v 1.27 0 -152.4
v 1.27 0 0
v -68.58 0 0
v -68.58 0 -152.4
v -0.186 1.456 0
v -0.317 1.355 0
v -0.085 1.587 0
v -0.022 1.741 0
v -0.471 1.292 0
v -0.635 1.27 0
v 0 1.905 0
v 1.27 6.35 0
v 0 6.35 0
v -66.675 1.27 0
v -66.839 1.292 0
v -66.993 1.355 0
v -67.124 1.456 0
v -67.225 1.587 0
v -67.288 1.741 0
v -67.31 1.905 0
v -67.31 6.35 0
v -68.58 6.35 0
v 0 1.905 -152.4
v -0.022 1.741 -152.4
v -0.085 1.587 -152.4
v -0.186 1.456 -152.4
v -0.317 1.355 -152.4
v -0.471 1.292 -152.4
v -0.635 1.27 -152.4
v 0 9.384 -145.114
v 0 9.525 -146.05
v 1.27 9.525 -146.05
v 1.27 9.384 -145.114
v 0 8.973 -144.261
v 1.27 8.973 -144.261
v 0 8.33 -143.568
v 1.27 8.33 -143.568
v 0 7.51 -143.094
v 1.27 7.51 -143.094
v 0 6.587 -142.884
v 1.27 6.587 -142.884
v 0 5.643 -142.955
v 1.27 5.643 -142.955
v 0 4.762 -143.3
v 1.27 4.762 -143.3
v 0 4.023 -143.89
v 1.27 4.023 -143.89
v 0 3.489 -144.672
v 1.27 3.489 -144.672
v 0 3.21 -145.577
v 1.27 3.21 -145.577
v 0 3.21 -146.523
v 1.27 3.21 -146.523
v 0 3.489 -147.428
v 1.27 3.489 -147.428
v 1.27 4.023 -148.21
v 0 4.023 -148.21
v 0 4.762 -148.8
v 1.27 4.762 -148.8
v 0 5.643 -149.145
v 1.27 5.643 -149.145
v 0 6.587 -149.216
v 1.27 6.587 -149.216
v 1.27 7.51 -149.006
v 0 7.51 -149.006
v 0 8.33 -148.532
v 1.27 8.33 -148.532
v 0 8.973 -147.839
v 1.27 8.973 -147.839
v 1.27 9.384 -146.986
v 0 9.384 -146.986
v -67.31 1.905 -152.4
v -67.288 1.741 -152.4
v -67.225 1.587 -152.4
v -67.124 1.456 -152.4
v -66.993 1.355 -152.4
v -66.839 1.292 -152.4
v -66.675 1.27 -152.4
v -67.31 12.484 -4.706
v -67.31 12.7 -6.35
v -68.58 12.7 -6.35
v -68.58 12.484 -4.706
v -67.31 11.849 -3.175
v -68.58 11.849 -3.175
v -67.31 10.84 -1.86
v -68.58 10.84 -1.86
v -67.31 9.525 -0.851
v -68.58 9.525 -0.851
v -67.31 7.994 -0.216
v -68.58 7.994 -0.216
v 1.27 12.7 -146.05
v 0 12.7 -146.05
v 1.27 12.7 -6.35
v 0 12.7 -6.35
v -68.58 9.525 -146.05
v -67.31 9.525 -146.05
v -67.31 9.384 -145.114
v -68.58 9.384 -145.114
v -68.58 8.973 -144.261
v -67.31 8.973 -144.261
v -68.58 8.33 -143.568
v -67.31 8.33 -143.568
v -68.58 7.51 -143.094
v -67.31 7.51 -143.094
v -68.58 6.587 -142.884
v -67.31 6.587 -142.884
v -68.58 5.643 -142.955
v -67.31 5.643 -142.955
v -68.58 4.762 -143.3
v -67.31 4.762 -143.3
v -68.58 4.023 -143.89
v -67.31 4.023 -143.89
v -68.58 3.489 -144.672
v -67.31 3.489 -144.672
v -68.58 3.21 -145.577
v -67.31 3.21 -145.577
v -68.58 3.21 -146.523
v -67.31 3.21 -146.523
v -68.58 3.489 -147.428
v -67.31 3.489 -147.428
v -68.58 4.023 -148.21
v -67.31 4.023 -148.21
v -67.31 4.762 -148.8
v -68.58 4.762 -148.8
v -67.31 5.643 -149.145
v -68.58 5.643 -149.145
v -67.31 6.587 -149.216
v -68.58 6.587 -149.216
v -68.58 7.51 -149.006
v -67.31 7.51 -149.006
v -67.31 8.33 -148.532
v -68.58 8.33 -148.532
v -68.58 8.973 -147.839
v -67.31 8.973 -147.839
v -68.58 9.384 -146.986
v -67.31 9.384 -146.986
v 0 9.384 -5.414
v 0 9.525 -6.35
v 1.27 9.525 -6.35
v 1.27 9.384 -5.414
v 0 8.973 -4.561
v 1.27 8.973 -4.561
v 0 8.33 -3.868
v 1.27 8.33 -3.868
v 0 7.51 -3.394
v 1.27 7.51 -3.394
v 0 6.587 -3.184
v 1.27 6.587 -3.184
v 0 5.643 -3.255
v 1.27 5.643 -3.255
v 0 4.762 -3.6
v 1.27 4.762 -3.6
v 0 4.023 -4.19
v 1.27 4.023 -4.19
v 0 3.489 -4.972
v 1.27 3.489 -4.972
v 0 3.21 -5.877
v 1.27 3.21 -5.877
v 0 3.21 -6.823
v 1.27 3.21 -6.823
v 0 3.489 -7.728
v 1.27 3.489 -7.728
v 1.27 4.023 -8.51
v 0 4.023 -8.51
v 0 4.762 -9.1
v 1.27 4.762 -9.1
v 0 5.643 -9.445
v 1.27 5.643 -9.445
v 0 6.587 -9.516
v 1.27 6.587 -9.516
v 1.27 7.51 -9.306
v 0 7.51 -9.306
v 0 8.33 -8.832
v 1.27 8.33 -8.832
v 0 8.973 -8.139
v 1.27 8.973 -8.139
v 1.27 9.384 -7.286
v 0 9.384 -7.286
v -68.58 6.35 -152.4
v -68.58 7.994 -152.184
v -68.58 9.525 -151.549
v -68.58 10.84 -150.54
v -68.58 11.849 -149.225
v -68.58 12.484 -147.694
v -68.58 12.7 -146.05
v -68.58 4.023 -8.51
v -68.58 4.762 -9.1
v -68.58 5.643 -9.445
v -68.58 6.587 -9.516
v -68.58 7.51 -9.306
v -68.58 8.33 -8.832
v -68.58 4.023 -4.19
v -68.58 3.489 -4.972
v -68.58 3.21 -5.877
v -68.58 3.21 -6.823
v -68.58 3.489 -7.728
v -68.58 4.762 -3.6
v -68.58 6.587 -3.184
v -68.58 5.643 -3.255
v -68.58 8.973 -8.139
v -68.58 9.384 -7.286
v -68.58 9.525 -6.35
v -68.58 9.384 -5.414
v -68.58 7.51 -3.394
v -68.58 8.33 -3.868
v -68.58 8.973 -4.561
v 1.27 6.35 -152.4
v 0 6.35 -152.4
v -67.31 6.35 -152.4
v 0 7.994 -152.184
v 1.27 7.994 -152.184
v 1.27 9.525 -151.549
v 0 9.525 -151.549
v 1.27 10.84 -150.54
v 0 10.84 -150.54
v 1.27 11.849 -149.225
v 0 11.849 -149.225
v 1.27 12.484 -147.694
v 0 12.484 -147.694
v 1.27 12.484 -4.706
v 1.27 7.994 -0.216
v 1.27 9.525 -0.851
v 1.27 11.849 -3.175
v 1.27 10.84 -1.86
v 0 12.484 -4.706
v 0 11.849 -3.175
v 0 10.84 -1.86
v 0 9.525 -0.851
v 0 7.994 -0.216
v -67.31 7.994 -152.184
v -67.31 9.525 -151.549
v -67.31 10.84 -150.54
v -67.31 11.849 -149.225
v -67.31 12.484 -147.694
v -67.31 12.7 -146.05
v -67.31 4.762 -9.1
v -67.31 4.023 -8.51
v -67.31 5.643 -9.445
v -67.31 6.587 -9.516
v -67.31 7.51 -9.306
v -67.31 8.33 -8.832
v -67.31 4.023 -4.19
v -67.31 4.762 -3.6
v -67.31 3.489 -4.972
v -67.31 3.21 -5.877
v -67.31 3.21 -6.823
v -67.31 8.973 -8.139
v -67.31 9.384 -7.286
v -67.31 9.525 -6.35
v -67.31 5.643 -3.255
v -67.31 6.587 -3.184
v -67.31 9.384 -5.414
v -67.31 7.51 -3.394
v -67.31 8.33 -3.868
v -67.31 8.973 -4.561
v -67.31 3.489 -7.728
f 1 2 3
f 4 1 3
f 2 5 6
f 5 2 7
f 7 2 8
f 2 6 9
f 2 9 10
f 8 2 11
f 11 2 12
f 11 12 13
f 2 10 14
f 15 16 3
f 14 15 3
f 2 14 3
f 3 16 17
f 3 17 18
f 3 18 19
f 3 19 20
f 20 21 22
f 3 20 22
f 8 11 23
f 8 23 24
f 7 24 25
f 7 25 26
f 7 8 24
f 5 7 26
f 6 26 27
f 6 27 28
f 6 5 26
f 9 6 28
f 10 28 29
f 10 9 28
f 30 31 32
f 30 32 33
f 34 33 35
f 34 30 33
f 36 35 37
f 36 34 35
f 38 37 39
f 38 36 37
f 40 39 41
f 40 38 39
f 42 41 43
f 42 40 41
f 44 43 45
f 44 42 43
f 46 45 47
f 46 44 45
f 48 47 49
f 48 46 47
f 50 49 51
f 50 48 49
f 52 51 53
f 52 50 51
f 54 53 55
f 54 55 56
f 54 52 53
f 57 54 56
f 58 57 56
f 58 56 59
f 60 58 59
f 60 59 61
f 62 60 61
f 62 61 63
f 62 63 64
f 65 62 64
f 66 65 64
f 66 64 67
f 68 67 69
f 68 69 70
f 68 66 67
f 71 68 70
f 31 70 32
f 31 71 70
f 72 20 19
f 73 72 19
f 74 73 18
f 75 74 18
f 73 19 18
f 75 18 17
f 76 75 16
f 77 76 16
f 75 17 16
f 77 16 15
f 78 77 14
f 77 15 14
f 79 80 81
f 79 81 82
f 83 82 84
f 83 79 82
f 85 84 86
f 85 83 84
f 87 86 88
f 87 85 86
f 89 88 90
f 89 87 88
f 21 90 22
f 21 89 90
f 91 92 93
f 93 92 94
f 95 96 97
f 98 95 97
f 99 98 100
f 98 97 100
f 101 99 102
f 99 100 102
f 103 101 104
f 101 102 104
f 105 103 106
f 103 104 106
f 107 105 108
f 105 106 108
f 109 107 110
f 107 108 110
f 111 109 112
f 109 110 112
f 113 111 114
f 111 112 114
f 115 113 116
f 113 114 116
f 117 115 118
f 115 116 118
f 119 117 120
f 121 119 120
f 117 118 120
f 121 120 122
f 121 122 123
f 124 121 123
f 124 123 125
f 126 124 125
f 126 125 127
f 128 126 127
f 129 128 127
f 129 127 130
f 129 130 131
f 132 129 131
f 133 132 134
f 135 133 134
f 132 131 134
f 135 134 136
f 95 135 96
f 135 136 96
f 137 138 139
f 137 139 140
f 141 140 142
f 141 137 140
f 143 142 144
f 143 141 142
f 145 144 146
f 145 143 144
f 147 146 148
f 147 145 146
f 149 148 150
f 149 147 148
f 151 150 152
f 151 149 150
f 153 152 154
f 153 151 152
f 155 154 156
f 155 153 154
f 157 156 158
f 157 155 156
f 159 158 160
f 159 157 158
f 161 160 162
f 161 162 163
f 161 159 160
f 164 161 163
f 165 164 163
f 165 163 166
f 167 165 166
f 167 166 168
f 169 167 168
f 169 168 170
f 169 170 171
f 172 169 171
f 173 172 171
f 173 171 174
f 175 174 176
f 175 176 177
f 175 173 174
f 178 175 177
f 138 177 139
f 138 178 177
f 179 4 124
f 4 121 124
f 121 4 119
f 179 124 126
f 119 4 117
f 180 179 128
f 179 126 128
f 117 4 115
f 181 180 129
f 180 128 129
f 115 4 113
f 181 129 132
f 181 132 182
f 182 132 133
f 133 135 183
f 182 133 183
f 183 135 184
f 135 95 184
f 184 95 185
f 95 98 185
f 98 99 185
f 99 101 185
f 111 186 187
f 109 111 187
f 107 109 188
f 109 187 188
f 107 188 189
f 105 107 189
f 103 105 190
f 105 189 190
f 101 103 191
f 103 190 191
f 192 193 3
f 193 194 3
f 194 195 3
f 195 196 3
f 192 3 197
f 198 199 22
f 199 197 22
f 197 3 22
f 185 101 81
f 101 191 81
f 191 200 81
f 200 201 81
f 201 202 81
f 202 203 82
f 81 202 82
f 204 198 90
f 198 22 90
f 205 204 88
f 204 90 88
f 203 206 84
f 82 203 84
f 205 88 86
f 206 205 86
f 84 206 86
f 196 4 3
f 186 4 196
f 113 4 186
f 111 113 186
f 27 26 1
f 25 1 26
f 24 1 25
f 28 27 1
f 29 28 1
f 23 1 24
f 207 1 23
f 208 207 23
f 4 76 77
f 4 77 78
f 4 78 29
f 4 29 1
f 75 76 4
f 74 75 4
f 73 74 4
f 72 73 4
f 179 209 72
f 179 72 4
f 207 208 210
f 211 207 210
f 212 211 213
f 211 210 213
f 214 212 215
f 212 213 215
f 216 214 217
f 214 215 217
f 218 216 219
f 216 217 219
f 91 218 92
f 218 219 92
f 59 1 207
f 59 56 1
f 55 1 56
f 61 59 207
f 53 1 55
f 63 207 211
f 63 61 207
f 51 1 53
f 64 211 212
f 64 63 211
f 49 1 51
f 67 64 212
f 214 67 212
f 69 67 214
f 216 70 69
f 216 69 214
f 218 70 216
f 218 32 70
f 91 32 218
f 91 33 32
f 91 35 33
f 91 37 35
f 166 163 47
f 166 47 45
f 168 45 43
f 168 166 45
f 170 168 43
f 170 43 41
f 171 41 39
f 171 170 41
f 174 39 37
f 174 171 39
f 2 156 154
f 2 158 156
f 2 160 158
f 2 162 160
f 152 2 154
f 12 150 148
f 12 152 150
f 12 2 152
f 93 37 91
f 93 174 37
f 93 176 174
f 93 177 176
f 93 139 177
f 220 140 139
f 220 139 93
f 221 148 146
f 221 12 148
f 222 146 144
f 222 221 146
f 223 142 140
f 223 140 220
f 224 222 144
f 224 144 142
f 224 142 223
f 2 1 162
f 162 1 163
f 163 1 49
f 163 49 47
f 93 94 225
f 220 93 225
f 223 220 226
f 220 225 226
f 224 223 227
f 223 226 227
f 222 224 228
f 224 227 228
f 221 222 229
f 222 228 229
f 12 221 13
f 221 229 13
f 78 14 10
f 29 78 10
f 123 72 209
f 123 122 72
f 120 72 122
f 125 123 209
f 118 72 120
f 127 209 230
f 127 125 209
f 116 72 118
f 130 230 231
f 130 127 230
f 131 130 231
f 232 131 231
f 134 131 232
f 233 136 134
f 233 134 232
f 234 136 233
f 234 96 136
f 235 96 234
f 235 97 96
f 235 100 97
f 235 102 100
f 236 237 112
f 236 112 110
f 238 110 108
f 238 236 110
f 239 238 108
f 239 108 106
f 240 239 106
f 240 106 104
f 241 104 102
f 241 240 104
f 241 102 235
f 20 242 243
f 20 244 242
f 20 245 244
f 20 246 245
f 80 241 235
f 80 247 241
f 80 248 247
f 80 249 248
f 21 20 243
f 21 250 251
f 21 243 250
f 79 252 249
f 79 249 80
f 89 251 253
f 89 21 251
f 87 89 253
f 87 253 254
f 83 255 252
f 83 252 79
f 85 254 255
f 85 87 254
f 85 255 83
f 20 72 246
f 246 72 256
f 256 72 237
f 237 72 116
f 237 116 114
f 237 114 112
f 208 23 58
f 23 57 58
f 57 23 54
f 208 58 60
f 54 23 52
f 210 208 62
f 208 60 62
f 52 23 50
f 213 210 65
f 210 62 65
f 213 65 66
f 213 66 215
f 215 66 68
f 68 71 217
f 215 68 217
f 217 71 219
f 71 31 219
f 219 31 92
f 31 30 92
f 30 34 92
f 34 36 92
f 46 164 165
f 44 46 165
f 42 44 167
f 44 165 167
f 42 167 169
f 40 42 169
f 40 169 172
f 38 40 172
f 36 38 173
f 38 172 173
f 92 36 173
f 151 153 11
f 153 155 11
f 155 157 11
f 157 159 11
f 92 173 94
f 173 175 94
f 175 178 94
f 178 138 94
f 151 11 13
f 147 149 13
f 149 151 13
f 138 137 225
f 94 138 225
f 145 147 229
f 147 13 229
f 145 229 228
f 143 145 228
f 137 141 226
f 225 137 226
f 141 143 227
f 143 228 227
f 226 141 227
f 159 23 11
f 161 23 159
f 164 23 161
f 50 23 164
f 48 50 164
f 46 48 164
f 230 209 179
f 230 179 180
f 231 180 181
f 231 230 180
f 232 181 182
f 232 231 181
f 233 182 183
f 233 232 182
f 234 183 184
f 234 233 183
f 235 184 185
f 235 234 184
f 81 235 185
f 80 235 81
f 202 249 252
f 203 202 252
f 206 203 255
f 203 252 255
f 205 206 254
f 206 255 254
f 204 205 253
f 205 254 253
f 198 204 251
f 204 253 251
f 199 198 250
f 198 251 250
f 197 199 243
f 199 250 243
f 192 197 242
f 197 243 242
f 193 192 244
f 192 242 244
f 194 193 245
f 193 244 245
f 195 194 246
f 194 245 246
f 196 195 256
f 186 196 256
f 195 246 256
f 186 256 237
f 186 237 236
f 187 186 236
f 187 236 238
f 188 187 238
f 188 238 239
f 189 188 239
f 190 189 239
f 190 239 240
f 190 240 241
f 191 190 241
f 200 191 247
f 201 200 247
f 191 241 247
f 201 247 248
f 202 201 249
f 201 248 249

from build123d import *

# Parameters (mm, degrees)
F0_R     = 3.175
F1_DEPTH = 1.27
F3_DEPTH = 152.4


with BuildPart() as f1:
    # F0 (on Right) → F1 (new body)
    with BuildSketch(Plane.YZ):
        with BuildLine():
            Line((6.35, 0), (0, 0))
            Line((0, 0), (0, -76.2))
            Line((0, -76.2), (12.7, -76.2))
            Line((12.7, -76.2), (12.7, -6.35))
            ThreePointArc((12.7, -6.35), (10.840128, -1.859872), (6.35, 0))
        make_face()
        with Locations((6.35, -6.35)):
            Circle(F0_R, mode=Mode.SUBTRACT)
        with BuildLine():
            Line((12.7, -76.2), (0, -76.2))
            Line((0, -76.2), (0, -152.4))
            Line((0, -152.4), (6.35, -152.4))
            ThreePointArc((6.35, -152.4), (10.840128, -150.540128), (12.7, -146.05))
            Line((12.7, -146.05), (12.7, -76.2))
        make_face()
        with Locations((6.35, -146.05)):
            Circle(F0_R, mode=Mode.SUBTRACT)
    extrude(amount=F1_DEPTH)

    # F2 (on face) → F3 (join, through all)
    with BuildSketch(Plane.XY):
        with BuildLine():
            ThreePointArc((0, 1.905), (-0.185987, 1.455987), (-0.635, 1.27))
            Line((-0.635, 1.27), (-33.655, 1.27))
            Line((-33.655, 1.27), (-33.655, 0))
            Line((-33.655, 0), (0, 0))
            Line((0, 0), (0, 1.905))
        make_face()
    extrude(amount=-F3_DEPTH)

    # F4: F1 across face


with BuildPart() as f1_1:
    add(f1.part)
    add(f1.part.mirror(Plane(origin=(-33.655, 0.635, -76.2), x_dir=(0, -1, 0), z_dir=(-1, 0, 0))))


solid = f1_1.part
